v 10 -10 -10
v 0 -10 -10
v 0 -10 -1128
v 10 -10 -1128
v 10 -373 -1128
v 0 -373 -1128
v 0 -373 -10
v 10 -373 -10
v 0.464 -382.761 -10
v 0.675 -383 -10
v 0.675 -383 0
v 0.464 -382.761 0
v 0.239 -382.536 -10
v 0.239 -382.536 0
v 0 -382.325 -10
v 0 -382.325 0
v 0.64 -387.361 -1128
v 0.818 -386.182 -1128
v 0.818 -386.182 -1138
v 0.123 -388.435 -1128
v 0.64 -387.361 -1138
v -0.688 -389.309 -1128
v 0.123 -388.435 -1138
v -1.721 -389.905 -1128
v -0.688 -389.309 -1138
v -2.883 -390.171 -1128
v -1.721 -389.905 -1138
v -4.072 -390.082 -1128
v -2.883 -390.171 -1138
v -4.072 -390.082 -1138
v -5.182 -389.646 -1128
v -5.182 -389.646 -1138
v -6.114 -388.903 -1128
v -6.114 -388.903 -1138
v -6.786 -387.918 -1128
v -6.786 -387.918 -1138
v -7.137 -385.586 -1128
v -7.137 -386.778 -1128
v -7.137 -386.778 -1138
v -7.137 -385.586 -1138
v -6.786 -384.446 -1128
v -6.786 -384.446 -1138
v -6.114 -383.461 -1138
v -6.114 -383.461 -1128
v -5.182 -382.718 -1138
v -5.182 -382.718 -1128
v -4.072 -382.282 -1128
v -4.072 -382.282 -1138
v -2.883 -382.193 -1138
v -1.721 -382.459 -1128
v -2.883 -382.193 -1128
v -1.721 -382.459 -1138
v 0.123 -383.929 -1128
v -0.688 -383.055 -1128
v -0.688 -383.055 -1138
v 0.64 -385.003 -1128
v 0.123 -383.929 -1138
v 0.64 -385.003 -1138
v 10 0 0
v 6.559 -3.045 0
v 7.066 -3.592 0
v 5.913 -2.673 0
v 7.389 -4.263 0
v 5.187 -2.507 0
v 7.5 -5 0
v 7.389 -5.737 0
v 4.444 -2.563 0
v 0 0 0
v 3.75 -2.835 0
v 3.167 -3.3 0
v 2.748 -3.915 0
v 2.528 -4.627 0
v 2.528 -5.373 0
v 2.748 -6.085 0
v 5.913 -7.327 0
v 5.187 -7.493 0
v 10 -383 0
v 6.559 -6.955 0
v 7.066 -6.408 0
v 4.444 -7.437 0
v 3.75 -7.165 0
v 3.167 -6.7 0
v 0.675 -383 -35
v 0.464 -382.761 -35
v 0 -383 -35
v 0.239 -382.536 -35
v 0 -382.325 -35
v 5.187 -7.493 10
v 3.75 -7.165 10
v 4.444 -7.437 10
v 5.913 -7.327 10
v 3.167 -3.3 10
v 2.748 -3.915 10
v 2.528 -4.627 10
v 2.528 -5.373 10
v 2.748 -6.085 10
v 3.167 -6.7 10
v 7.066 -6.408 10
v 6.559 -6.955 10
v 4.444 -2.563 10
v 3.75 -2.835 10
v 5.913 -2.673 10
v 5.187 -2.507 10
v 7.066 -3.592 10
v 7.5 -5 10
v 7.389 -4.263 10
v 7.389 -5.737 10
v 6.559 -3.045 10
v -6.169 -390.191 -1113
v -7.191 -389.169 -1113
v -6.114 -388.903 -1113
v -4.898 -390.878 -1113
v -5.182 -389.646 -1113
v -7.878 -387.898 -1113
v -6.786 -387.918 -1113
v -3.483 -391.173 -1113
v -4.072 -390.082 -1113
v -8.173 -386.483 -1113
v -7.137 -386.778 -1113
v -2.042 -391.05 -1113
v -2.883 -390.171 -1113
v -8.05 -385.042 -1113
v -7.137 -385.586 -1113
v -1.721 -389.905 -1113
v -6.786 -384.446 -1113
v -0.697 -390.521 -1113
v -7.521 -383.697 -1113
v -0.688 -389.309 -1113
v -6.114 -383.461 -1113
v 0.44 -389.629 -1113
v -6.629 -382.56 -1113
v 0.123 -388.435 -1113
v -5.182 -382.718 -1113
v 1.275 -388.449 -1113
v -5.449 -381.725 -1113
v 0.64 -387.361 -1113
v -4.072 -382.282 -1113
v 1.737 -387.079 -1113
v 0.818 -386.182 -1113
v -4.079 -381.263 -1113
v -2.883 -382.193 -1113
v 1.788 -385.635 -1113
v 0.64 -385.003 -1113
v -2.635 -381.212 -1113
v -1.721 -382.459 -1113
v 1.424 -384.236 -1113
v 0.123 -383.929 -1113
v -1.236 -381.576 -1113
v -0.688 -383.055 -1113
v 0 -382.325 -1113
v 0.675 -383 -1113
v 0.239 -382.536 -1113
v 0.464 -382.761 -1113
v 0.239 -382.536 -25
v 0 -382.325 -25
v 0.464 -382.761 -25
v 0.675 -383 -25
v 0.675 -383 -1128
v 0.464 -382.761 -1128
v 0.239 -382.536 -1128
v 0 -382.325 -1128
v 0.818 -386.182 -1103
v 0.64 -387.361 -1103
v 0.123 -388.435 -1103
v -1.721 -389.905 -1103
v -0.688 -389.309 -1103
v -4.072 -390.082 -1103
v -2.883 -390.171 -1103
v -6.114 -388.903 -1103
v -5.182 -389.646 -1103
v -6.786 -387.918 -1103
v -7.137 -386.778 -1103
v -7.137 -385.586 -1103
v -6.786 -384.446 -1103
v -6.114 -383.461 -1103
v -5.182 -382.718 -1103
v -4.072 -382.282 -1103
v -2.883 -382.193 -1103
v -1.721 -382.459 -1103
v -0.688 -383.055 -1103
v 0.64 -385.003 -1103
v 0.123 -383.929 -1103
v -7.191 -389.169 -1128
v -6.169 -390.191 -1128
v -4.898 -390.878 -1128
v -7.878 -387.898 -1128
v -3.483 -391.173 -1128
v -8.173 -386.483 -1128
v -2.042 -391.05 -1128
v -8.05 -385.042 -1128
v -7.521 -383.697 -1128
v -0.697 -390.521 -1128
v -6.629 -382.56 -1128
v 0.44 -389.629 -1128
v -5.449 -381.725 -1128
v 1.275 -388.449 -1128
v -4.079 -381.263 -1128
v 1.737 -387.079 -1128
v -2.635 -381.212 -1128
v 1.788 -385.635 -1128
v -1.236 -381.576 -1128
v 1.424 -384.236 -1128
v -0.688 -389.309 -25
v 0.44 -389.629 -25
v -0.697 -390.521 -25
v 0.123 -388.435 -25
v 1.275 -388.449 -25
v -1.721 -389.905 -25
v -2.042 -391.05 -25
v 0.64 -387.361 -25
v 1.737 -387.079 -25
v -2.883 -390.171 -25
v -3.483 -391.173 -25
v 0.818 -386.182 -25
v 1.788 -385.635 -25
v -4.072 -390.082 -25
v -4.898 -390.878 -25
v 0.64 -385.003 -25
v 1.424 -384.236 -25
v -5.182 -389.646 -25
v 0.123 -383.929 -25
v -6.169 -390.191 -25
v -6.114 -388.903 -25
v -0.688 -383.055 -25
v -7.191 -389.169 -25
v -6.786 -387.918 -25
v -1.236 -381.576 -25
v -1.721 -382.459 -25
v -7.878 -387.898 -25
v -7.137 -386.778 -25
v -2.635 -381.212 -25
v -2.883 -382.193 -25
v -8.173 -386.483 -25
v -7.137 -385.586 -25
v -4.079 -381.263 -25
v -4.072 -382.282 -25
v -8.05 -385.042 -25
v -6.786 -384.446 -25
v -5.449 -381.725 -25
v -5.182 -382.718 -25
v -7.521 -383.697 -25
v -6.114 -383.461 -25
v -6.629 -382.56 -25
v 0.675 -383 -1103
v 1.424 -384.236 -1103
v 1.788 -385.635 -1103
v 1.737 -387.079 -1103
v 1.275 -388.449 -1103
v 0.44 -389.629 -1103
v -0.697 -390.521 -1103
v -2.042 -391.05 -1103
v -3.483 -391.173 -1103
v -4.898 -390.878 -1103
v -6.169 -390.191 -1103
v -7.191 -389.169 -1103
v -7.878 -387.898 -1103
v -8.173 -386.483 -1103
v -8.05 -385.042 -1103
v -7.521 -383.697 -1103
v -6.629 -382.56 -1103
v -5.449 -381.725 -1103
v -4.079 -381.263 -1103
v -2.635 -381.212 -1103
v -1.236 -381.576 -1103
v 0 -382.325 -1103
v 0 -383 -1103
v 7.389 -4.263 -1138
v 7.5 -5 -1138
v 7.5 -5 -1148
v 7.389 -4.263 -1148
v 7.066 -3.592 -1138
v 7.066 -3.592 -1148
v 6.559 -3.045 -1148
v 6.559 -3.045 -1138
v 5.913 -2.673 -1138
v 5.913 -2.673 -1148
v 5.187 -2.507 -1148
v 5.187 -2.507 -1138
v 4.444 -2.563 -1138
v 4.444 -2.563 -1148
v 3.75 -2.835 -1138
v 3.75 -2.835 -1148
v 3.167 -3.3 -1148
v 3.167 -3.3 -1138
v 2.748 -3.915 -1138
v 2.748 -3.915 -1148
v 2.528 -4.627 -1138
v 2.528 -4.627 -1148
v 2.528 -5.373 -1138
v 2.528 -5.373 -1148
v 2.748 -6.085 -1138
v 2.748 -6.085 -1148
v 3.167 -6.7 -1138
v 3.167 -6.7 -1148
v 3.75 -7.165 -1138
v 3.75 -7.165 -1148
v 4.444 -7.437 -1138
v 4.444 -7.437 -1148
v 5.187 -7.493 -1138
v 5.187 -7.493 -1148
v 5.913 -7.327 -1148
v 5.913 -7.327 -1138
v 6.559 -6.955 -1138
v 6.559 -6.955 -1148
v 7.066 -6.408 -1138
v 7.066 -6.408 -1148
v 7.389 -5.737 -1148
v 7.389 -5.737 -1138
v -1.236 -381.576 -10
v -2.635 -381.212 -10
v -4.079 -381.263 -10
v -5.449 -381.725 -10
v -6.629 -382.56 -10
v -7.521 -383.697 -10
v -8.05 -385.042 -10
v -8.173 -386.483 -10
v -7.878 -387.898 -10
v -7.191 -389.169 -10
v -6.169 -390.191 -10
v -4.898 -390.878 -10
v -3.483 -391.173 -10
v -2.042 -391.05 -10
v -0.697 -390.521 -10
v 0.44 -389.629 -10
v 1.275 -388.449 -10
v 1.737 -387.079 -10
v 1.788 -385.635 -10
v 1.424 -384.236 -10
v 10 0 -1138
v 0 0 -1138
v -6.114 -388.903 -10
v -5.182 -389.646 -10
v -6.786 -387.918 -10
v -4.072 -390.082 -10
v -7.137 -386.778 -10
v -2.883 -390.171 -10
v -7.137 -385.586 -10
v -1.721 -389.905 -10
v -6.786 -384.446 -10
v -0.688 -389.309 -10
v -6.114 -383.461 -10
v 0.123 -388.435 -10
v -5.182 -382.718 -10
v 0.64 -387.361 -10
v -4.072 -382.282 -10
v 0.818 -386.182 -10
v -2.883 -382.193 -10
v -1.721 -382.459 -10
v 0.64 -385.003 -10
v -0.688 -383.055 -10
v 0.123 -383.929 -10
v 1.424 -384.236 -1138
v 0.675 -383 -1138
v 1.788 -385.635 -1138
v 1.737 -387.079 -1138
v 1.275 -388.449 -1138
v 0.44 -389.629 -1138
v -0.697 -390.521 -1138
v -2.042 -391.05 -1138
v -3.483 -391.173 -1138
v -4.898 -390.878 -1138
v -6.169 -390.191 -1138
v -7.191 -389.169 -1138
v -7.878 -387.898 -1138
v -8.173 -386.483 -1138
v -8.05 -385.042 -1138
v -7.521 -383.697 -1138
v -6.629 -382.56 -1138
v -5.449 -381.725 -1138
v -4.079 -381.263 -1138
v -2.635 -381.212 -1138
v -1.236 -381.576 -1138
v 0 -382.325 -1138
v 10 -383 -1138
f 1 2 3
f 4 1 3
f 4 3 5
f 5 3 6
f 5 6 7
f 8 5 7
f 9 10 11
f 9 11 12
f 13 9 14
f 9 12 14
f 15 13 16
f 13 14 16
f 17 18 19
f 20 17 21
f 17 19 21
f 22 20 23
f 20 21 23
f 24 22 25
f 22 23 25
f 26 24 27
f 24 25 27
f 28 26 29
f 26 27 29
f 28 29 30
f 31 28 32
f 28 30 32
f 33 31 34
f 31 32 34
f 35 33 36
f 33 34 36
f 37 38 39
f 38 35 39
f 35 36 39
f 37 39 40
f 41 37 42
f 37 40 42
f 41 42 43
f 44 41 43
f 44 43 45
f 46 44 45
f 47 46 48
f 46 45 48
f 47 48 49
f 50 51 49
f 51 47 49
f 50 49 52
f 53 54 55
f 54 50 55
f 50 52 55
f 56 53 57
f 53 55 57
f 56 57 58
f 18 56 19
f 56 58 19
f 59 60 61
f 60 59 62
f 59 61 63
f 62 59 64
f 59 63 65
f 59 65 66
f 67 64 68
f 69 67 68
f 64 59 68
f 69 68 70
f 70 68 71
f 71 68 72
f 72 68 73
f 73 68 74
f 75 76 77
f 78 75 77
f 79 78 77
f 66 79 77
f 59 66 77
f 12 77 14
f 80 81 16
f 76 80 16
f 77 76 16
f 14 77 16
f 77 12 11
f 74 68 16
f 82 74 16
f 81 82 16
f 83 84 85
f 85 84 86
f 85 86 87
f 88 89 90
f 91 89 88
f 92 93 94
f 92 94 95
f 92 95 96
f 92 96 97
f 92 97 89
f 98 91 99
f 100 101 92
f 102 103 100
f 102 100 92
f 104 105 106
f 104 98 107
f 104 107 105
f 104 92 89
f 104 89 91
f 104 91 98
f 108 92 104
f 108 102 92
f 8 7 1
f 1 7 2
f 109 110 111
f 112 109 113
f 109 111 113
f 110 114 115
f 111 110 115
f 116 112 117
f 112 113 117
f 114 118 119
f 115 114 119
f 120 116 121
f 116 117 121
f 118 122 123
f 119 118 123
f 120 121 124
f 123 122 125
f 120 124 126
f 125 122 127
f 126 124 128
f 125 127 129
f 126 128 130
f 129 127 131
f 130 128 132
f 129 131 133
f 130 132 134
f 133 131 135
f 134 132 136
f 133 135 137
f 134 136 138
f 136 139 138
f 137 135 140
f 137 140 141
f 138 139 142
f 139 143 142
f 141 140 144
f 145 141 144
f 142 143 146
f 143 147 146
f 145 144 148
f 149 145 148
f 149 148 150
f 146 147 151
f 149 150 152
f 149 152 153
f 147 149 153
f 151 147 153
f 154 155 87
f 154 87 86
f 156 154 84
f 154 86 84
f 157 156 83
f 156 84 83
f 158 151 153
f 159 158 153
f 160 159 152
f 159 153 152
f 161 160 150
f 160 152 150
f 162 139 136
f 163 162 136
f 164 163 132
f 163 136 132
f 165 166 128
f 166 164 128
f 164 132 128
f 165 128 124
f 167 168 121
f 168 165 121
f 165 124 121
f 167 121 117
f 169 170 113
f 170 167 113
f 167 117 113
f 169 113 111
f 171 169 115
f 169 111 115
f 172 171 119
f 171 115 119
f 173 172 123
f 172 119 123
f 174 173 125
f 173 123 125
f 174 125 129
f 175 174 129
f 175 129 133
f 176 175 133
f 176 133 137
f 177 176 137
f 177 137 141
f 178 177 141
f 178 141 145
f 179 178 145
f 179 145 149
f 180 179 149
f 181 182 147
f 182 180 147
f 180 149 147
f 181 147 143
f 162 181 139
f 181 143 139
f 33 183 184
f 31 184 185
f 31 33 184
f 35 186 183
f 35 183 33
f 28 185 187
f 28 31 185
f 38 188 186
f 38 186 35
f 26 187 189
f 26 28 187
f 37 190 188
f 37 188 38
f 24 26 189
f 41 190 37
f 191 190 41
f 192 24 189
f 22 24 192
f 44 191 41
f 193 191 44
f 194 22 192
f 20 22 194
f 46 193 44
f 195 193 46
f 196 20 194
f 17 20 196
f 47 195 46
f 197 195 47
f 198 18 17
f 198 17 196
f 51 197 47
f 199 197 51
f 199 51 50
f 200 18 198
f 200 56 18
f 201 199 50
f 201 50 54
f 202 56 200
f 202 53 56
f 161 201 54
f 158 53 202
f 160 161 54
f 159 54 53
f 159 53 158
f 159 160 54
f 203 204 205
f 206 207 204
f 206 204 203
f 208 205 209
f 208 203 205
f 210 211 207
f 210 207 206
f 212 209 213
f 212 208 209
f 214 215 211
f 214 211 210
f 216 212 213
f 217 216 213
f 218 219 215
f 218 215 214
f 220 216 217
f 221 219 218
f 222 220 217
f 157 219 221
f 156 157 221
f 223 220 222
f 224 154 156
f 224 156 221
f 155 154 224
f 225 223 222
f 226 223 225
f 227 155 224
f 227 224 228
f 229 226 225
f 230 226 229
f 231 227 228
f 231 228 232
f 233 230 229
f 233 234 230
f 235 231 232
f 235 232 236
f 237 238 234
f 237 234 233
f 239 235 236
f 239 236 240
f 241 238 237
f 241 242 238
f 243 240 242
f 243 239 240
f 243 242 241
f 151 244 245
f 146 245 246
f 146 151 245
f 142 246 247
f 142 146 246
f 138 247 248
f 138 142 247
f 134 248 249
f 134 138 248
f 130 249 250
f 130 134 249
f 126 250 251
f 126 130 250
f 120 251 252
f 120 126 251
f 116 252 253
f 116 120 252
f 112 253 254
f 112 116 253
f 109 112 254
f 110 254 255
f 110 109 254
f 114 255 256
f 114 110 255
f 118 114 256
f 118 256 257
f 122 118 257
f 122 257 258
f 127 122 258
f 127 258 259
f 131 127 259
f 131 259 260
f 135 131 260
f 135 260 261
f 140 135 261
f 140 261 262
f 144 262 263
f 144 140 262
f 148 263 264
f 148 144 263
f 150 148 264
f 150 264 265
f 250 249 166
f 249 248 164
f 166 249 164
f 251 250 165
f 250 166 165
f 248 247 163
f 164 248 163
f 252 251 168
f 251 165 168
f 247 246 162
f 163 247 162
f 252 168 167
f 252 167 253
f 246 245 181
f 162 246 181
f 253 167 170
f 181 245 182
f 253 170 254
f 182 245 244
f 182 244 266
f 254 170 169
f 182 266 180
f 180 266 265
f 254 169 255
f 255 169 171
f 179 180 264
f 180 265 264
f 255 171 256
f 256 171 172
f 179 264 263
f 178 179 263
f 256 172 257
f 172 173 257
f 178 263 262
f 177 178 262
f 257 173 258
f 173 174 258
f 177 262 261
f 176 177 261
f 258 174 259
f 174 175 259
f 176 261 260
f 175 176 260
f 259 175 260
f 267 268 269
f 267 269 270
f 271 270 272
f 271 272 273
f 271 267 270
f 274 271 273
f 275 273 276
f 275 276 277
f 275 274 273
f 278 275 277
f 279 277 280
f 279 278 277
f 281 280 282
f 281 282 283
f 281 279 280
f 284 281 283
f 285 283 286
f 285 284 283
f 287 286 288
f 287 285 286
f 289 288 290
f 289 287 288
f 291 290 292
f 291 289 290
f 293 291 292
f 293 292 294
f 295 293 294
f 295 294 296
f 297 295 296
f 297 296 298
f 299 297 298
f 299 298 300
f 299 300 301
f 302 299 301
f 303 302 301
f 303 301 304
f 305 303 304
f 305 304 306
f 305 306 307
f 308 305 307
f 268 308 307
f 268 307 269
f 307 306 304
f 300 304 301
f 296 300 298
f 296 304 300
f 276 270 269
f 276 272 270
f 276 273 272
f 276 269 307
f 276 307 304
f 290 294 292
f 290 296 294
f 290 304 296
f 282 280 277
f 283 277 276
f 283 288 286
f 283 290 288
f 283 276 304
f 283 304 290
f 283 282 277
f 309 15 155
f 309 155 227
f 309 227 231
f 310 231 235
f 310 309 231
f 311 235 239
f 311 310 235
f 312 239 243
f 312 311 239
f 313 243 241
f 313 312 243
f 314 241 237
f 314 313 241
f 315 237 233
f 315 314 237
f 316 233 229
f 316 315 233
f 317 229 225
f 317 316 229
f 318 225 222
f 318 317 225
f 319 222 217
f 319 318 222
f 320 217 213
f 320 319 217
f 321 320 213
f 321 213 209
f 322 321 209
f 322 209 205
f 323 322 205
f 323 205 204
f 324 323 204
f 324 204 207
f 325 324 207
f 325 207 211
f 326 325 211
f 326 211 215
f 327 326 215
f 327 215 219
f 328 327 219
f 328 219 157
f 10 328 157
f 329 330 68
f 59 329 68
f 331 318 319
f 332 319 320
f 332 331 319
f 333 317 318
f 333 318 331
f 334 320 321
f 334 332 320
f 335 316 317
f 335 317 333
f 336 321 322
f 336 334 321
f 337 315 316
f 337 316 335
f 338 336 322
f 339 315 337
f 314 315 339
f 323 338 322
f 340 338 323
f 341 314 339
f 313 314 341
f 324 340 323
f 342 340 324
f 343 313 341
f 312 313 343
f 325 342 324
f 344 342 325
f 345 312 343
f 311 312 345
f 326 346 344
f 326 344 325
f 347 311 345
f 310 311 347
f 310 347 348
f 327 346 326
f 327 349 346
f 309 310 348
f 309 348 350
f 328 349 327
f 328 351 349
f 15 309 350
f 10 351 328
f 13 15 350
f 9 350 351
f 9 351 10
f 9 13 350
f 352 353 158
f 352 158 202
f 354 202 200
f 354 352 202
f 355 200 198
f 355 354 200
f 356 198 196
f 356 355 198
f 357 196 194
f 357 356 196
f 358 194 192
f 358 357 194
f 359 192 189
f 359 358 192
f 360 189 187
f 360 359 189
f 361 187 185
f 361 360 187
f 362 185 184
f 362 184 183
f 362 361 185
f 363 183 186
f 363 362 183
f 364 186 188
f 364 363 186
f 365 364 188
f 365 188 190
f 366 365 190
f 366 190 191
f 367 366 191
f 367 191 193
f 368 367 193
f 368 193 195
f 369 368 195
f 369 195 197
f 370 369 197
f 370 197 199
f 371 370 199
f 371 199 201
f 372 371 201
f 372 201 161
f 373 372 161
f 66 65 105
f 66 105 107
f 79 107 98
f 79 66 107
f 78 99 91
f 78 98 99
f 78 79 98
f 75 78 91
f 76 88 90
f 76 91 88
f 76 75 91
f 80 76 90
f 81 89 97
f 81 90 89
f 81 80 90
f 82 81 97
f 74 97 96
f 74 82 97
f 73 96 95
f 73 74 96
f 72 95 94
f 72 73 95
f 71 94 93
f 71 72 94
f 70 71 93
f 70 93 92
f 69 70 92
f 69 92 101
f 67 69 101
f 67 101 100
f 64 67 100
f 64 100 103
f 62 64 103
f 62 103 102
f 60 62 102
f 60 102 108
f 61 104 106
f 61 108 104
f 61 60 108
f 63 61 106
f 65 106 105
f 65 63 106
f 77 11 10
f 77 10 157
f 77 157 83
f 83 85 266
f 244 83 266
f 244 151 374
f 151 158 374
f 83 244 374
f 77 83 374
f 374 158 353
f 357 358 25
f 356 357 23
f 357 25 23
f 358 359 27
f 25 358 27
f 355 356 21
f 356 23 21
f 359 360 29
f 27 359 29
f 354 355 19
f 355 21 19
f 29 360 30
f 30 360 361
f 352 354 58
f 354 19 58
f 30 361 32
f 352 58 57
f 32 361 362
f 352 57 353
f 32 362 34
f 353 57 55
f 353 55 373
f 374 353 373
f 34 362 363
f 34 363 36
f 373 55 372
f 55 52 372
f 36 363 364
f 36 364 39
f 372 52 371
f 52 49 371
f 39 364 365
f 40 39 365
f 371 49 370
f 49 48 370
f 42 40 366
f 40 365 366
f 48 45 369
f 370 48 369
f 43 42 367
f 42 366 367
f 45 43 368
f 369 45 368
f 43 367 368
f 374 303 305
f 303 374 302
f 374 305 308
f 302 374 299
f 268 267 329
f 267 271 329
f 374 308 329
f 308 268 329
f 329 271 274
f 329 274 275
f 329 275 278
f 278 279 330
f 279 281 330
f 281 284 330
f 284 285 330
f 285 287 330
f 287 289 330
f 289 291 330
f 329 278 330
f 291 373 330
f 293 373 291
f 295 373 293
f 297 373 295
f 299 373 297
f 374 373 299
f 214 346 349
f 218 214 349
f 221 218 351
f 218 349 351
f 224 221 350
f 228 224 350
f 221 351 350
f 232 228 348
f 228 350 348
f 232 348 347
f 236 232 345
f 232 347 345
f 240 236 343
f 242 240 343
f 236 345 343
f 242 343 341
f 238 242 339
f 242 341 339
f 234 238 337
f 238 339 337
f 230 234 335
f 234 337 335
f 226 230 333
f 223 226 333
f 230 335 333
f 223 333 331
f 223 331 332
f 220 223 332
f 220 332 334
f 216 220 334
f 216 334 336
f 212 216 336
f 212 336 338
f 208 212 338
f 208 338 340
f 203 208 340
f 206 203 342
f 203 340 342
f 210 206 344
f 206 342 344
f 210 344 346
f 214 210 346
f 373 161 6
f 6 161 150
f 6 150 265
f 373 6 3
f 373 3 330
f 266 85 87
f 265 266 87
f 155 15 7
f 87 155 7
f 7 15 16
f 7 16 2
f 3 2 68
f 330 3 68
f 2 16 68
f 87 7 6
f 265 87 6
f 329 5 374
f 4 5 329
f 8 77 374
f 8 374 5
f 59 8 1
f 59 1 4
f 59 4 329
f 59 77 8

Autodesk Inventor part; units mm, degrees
ref_plane "YZ Plane" through (0, 0, 0) normal (1, 0, 0) x (0, 1, 0)
ref_plane "XZ Plane" through (0, 0, 0) normal (0, 1, 0) x (-1, 0, 0)
ref_plane "XY Plane" through (0, 0, 0) normal (0, 0, 1) x (1, 0, 0)
sketch "Sketch1" plane through (0, 0, 0) normal (1, 0, 0) x (0, 1, 0)
  line L0 (0, 0) -> (-383, 0)
  line L1 (-383, 0) -> (-383, -1138)
  line L2 (-383, -1138) -> (0, -1138)
  line L3 (0, -1138) -> (0, 0)
  line L4 (-373, -1128) -> (-373, -10)
  line L5 (-373, -10) -> (-10, -10)
  line L6 (-10, -10) -> (-10, -1128)
  line L7 (-10, -1128) -> (-373, -1128)
  dimension "d0" = 383
  dimension "portaAltura" = 1138
  dimension "d2" = 10
  dimension "portaLargura" = 363
extrude "Extrusion1" add sketch "Sketch1" along normal blind 10
sketch "Sketch2" plane through (0, -383, 0) normal (0, 0, 1) x (1, 0, 0)
  line L0 (0, 383) -> (0, 0) projected
  line L1 (0, 0) -> (10, 0) projected
  line L2 (10, 383) -> (10, 0) projected
  line L3 (0, 383) -> (10, 383) projected
  line L4 (0, 0) -> (-3.182, -3.182)
  line L5 (0, 0) -> (4.5, 0) construction
  line L6 (0, 383) -> (0, 0) projected
  circle A0 centre (-3.182, -3.182) radius 5
  circle A1 centre (-3.182, -3.182) radius 4
  dimension "d5" = 4.5
  dimension "d6" = 135
  dimension "d7" = 1
  dimension "d10" = 10
extrude "Extrusion2" add sketch "Sketch2" against normal blind 35 contours A0 L1 L0 | L0 L1 A0
ref_plane "Work Plane1" through (0, 0, -569) normal (0, 0, 1) x (1, 0, 0)
mirror "Mirror1" about plane through (0, 0, -569) normal (0, 0, 1) of "Extrusion2"
fillet "Fillet1" [suppressed]
ref_plane "Work Plane2" through (0, -383, -1113) normal (0, 0, 1) x (1, 0, 0)
sketch "Sketch3" plane through (0, -383, -1113) normal (0, 0, 1) x (1, 0, 0)
  arc A0 (0, 0.6748) -> (0.6748, 0) centre (-3.182, -3.182) ccw projected
  circle A1 centre (-3.182, -3.182) radius 4 projected
  line L0 (0.6748, 0) -> (10, 0) projected
  circle A2 centre (-3.182, -3.182) radius 5
  point P0 (0, 383)
  point P1 (0, 0.6748)
extrude "Extrusion3" cut sketch "Sketch3" against normal blind 15
sketch "Sketch4" plane through (0, 0, 0) normal (0, 0, 1) x (1, 0, 0)
  circle A0 centre (-3.182, -386.182) radius 4 projected
  arc A1 (0, -382.3252) -> (0.6748, -383) centre (-3.182, -386.182) ccw projected
  circle A2 centre (-3.182, -386.182) radius 4 projected
  line L0 (0.6748, -383) -> (10, -383) projected
  circle A3 centre (-3.182, -386.182) radius 5
  point P0 (0, 0)
  point P1 (0, -382.3252)
extrude "Extrusion4" cut sketch "Sketch4" against normal blind 10
sketch "Sketch5" plane through (0, -383, -35) normal (0, 0, -1) x (-1, 0, 0)
  circle A0 centre (3.182, -3.182) radius 4 projected
  arc A1 (-0.6748, 0) -> (0, 0.6748) centre (3.182, -3.182) ccw projected
  circle A2 centre (3.182, -3.182) radius 5
  point P0 (0, 383)
  point P1 (0, 0.6748)
extrude "Extrusion5" cut sketch "Sketch5" against normal blind 10
sketch "Sketch6" plane through (0, 0, 0) normal (0, 0, 1) x (1, 0, 0)
  arc A0 (0.6748, -383) -> (0, -382.3252) centre (-3.182, -386.182) ccw projected
  line L0 (0.6748, -383) -> (10, -383) projected
  line L1 (10, 0) -> (10, -383) projected
  line L2 (0, 0) -> (10, 0) projected
  line L3 (0, 0) -> (0, -382.3252) projected
  line L4 (10, -383) -> (10, 0) construction
  line L5 (0, -10) -> (10, -10) construction
  line L6 (10, 0) -> (0, -10) construction
  line L7 (0, 0) -> (10, 0) construction
  line L8 (0, 0) -> (10, -10) construction
  circle A1 centre (5, -5) radius 2.5
  dimension "d19" = 5
extrude "Extrusion6" add sketch "Sketch6" along normal blind 10 contours A1
sketch "Sketch7" plane through (5, -5, 10) normal (0, 0, 1) x (1, 0, 0)
  circle A0 centre (0, 0) radius 2.5 projected
  circle A1 centre (0, 0) radius 5
  point P0 (-5, 5)
  dimension "d22" = 10
extrude "Extrusion7" [suppressed]
mirror "Mirror2" about plane through (0, 0, -569) normal (0, 0, 1) of "Extrusion6"
properties part number "porta1"
